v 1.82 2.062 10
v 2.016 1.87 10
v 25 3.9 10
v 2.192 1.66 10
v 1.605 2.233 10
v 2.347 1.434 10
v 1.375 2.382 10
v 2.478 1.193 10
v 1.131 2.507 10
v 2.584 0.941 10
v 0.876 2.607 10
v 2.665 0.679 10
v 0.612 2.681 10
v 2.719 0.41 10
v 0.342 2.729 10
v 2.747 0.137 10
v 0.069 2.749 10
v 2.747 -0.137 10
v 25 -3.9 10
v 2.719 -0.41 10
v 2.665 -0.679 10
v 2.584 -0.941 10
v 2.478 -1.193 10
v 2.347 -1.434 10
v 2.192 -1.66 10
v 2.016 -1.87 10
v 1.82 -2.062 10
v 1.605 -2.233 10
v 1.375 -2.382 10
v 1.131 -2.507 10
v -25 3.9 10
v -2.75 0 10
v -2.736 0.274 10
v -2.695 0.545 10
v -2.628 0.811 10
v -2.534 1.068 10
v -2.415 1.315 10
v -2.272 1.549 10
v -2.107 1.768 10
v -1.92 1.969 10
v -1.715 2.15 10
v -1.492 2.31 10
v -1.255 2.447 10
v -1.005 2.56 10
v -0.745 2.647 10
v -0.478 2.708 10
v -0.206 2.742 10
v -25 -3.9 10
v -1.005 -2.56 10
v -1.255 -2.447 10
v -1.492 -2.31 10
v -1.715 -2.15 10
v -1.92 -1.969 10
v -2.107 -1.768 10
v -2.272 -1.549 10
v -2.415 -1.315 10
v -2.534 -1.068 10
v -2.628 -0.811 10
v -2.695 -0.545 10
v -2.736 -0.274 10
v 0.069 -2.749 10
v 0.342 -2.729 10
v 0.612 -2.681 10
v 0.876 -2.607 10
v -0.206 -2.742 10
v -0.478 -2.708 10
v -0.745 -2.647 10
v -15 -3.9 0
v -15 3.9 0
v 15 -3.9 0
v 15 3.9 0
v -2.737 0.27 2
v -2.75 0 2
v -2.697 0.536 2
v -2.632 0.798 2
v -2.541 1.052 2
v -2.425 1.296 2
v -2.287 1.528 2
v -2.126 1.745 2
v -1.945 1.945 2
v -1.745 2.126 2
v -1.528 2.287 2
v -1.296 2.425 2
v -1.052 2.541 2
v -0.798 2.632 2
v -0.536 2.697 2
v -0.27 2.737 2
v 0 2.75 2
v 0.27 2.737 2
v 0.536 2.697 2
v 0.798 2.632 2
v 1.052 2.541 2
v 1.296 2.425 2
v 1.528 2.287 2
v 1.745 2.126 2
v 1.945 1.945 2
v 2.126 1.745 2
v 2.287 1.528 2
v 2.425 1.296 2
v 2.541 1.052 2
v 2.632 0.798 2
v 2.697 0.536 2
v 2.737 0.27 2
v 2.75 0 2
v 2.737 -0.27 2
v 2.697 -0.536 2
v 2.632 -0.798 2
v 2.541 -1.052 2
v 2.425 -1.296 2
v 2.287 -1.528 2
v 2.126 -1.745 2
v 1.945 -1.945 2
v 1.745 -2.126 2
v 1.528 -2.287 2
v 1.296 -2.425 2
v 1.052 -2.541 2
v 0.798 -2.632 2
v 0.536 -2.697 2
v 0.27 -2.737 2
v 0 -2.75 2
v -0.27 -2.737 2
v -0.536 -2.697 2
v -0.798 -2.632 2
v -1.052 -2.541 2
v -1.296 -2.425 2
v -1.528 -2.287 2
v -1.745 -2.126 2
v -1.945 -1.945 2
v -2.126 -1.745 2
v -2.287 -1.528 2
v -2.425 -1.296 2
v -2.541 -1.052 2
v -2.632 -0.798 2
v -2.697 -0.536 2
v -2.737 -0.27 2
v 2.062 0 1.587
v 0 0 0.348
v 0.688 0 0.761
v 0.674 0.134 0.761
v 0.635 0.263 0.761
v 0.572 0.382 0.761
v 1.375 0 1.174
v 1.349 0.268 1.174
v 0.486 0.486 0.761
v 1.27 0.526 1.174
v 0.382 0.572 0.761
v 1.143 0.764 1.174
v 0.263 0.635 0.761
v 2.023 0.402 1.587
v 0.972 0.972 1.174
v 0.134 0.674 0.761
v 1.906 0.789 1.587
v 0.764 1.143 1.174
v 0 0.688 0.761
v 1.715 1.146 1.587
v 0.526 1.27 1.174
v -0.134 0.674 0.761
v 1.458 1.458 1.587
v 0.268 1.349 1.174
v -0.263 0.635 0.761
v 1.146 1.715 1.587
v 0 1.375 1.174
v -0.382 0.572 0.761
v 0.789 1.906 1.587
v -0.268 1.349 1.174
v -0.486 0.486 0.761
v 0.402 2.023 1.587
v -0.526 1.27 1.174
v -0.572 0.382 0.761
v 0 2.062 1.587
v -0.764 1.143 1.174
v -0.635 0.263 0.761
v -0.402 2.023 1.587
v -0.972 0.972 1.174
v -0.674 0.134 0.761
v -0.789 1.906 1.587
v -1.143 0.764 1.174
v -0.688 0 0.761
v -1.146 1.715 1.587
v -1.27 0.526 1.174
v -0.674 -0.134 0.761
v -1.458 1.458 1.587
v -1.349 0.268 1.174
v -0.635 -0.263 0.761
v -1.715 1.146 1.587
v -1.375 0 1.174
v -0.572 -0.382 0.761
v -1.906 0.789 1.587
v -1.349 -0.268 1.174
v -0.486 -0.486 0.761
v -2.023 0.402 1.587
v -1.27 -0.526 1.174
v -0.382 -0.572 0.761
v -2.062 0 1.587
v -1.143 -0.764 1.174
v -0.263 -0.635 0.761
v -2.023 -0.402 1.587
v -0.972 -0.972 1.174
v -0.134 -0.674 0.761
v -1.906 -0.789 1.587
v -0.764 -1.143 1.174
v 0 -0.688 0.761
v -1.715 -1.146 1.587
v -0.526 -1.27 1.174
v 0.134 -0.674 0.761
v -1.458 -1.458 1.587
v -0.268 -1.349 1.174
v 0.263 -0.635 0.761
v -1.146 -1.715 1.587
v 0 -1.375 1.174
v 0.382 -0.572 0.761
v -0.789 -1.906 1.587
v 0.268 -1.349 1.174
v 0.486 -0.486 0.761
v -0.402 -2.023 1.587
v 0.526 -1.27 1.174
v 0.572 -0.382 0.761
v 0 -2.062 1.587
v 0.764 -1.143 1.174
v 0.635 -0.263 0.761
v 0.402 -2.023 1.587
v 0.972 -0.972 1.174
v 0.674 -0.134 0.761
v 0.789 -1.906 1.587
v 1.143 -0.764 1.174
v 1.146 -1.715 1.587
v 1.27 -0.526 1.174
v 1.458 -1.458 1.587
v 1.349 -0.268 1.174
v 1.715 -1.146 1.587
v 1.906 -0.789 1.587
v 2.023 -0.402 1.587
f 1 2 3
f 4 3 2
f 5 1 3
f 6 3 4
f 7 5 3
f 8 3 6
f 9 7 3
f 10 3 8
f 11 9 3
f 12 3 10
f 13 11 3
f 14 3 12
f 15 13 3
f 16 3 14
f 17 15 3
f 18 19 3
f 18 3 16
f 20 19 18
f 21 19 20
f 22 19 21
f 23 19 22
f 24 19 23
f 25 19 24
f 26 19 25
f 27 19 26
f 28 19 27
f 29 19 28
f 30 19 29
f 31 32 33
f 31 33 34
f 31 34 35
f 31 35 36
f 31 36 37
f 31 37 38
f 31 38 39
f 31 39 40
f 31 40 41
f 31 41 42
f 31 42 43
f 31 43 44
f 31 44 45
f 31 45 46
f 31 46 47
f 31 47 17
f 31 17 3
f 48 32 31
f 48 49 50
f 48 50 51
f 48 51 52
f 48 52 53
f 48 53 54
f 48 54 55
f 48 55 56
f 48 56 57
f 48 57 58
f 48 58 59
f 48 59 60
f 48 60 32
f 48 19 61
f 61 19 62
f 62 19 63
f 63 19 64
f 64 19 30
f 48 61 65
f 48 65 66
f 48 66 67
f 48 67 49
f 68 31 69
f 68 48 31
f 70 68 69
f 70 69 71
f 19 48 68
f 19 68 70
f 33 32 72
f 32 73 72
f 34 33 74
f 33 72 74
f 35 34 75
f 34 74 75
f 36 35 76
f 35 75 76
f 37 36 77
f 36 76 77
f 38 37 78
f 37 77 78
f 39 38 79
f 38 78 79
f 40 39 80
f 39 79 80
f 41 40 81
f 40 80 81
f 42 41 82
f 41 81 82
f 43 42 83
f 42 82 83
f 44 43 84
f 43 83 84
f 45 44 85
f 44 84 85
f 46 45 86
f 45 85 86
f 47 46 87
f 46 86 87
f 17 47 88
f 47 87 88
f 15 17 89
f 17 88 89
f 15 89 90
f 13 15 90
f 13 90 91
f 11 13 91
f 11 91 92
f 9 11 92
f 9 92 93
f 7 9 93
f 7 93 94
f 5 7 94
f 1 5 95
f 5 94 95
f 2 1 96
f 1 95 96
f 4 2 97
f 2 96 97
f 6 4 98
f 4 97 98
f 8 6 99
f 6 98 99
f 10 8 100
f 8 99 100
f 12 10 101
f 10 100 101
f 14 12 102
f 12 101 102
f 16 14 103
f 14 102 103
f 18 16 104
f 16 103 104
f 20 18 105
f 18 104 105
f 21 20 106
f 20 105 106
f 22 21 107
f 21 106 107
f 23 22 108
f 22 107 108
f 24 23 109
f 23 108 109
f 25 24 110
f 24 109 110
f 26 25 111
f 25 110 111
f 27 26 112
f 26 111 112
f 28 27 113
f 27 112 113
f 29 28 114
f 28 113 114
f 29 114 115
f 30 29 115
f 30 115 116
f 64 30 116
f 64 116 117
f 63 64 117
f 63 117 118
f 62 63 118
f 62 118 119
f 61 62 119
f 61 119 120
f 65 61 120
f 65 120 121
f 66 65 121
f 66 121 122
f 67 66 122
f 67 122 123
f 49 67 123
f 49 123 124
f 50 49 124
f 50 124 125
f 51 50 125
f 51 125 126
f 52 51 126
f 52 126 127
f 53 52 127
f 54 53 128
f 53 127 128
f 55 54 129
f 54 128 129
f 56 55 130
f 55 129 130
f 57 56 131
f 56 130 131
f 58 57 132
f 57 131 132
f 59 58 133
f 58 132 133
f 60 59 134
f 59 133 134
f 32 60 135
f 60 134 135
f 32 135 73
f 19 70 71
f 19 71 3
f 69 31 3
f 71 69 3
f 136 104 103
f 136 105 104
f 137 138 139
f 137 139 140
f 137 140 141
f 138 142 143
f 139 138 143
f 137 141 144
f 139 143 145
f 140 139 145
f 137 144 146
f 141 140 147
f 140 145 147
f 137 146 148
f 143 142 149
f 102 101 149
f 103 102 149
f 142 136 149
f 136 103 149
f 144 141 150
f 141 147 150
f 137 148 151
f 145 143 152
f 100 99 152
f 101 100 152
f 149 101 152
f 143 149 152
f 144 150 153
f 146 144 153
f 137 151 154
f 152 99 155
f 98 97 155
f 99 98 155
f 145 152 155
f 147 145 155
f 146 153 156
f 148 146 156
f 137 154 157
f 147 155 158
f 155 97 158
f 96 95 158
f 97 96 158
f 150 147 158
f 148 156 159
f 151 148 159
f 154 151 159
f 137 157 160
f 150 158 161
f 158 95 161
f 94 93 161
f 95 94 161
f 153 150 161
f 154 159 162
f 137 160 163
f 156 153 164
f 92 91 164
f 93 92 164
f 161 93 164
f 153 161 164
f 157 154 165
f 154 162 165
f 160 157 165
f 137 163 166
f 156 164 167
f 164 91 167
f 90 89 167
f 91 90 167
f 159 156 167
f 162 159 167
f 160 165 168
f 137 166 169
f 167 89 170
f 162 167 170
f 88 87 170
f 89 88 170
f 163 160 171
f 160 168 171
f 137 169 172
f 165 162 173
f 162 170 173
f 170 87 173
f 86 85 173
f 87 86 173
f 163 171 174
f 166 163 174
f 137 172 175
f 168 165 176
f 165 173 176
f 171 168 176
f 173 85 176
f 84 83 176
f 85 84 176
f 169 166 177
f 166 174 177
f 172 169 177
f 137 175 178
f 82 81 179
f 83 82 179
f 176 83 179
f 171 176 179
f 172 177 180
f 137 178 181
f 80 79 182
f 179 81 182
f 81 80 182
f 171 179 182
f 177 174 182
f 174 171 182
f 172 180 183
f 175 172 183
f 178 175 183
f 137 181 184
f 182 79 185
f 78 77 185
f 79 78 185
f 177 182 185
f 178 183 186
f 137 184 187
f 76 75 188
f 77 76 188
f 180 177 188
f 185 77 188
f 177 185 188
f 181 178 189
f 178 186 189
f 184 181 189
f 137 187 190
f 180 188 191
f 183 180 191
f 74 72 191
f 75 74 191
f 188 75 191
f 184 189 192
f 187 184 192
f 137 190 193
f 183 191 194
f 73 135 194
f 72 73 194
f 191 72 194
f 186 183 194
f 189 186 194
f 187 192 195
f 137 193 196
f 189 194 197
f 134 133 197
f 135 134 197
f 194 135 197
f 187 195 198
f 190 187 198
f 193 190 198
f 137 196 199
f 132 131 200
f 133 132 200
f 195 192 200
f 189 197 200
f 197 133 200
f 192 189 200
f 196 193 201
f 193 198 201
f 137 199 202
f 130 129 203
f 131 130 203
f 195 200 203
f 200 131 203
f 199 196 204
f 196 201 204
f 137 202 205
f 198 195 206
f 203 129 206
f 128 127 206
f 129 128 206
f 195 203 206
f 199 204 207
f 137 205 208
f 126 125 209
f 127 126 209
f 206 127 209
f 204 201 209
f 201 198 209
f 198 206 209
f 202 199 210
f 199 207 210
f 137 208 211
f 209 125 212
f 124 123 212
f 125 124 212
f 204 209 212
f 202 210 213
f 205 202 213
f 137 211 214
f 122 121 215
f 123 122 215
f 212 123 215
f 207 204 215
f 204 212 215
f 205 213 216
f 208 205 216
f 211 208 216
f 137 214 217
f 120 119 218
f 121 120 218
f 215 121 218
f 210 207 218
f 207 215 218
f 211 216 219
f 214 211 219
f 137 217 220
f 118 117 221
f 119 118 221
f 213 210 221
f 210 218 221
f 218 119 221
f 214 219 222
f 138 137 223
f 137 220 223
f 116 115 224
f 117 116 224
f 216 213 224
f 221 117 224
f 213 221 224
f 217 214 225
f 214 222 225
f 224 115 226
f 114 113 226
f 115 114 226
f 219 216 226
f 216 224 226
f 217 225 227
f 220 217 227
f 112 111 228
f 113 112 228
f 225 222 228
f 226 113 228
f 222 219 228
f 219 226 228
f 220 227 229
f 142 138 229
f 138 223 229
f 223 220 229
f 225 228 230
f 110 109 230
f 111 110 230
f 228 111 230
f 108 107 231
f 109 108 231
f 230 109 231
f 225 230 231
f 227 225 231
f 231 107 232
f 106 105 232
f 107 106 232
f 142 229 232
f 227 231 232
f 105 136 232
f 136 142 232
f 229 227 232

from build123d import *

# Parameters (mm, degrees)
F1_DEPTH = 3.9
F3_D     = 5.5
F3_DEPTH = 8
F3_TIP   = 1.6523667023


with BuildPart() as f1:
    # F0 (on Front) → F1 (new body, symmetric)
    with BuildSketch(Plane.XZ):
        Polygon((-25, 10), (-15, 0), (15, 0), (25, 10), align=None)
    extrude(amount=F1_DEPTH, both=True)

    # F3
    with Locations(Plane.XY.offset(10)):
        with Locations((0, 0)):
            Hole(F3_D / 2, depth=F3_DEPTH)
            with Locations((0, 0, -(F3_DEPTH + F3_TIP / 2))):  # 118° drill point
                Cone(0, F3_D / 2, F3_TIP, mode=Mode.SUBTRACT)


solid = f1.part
